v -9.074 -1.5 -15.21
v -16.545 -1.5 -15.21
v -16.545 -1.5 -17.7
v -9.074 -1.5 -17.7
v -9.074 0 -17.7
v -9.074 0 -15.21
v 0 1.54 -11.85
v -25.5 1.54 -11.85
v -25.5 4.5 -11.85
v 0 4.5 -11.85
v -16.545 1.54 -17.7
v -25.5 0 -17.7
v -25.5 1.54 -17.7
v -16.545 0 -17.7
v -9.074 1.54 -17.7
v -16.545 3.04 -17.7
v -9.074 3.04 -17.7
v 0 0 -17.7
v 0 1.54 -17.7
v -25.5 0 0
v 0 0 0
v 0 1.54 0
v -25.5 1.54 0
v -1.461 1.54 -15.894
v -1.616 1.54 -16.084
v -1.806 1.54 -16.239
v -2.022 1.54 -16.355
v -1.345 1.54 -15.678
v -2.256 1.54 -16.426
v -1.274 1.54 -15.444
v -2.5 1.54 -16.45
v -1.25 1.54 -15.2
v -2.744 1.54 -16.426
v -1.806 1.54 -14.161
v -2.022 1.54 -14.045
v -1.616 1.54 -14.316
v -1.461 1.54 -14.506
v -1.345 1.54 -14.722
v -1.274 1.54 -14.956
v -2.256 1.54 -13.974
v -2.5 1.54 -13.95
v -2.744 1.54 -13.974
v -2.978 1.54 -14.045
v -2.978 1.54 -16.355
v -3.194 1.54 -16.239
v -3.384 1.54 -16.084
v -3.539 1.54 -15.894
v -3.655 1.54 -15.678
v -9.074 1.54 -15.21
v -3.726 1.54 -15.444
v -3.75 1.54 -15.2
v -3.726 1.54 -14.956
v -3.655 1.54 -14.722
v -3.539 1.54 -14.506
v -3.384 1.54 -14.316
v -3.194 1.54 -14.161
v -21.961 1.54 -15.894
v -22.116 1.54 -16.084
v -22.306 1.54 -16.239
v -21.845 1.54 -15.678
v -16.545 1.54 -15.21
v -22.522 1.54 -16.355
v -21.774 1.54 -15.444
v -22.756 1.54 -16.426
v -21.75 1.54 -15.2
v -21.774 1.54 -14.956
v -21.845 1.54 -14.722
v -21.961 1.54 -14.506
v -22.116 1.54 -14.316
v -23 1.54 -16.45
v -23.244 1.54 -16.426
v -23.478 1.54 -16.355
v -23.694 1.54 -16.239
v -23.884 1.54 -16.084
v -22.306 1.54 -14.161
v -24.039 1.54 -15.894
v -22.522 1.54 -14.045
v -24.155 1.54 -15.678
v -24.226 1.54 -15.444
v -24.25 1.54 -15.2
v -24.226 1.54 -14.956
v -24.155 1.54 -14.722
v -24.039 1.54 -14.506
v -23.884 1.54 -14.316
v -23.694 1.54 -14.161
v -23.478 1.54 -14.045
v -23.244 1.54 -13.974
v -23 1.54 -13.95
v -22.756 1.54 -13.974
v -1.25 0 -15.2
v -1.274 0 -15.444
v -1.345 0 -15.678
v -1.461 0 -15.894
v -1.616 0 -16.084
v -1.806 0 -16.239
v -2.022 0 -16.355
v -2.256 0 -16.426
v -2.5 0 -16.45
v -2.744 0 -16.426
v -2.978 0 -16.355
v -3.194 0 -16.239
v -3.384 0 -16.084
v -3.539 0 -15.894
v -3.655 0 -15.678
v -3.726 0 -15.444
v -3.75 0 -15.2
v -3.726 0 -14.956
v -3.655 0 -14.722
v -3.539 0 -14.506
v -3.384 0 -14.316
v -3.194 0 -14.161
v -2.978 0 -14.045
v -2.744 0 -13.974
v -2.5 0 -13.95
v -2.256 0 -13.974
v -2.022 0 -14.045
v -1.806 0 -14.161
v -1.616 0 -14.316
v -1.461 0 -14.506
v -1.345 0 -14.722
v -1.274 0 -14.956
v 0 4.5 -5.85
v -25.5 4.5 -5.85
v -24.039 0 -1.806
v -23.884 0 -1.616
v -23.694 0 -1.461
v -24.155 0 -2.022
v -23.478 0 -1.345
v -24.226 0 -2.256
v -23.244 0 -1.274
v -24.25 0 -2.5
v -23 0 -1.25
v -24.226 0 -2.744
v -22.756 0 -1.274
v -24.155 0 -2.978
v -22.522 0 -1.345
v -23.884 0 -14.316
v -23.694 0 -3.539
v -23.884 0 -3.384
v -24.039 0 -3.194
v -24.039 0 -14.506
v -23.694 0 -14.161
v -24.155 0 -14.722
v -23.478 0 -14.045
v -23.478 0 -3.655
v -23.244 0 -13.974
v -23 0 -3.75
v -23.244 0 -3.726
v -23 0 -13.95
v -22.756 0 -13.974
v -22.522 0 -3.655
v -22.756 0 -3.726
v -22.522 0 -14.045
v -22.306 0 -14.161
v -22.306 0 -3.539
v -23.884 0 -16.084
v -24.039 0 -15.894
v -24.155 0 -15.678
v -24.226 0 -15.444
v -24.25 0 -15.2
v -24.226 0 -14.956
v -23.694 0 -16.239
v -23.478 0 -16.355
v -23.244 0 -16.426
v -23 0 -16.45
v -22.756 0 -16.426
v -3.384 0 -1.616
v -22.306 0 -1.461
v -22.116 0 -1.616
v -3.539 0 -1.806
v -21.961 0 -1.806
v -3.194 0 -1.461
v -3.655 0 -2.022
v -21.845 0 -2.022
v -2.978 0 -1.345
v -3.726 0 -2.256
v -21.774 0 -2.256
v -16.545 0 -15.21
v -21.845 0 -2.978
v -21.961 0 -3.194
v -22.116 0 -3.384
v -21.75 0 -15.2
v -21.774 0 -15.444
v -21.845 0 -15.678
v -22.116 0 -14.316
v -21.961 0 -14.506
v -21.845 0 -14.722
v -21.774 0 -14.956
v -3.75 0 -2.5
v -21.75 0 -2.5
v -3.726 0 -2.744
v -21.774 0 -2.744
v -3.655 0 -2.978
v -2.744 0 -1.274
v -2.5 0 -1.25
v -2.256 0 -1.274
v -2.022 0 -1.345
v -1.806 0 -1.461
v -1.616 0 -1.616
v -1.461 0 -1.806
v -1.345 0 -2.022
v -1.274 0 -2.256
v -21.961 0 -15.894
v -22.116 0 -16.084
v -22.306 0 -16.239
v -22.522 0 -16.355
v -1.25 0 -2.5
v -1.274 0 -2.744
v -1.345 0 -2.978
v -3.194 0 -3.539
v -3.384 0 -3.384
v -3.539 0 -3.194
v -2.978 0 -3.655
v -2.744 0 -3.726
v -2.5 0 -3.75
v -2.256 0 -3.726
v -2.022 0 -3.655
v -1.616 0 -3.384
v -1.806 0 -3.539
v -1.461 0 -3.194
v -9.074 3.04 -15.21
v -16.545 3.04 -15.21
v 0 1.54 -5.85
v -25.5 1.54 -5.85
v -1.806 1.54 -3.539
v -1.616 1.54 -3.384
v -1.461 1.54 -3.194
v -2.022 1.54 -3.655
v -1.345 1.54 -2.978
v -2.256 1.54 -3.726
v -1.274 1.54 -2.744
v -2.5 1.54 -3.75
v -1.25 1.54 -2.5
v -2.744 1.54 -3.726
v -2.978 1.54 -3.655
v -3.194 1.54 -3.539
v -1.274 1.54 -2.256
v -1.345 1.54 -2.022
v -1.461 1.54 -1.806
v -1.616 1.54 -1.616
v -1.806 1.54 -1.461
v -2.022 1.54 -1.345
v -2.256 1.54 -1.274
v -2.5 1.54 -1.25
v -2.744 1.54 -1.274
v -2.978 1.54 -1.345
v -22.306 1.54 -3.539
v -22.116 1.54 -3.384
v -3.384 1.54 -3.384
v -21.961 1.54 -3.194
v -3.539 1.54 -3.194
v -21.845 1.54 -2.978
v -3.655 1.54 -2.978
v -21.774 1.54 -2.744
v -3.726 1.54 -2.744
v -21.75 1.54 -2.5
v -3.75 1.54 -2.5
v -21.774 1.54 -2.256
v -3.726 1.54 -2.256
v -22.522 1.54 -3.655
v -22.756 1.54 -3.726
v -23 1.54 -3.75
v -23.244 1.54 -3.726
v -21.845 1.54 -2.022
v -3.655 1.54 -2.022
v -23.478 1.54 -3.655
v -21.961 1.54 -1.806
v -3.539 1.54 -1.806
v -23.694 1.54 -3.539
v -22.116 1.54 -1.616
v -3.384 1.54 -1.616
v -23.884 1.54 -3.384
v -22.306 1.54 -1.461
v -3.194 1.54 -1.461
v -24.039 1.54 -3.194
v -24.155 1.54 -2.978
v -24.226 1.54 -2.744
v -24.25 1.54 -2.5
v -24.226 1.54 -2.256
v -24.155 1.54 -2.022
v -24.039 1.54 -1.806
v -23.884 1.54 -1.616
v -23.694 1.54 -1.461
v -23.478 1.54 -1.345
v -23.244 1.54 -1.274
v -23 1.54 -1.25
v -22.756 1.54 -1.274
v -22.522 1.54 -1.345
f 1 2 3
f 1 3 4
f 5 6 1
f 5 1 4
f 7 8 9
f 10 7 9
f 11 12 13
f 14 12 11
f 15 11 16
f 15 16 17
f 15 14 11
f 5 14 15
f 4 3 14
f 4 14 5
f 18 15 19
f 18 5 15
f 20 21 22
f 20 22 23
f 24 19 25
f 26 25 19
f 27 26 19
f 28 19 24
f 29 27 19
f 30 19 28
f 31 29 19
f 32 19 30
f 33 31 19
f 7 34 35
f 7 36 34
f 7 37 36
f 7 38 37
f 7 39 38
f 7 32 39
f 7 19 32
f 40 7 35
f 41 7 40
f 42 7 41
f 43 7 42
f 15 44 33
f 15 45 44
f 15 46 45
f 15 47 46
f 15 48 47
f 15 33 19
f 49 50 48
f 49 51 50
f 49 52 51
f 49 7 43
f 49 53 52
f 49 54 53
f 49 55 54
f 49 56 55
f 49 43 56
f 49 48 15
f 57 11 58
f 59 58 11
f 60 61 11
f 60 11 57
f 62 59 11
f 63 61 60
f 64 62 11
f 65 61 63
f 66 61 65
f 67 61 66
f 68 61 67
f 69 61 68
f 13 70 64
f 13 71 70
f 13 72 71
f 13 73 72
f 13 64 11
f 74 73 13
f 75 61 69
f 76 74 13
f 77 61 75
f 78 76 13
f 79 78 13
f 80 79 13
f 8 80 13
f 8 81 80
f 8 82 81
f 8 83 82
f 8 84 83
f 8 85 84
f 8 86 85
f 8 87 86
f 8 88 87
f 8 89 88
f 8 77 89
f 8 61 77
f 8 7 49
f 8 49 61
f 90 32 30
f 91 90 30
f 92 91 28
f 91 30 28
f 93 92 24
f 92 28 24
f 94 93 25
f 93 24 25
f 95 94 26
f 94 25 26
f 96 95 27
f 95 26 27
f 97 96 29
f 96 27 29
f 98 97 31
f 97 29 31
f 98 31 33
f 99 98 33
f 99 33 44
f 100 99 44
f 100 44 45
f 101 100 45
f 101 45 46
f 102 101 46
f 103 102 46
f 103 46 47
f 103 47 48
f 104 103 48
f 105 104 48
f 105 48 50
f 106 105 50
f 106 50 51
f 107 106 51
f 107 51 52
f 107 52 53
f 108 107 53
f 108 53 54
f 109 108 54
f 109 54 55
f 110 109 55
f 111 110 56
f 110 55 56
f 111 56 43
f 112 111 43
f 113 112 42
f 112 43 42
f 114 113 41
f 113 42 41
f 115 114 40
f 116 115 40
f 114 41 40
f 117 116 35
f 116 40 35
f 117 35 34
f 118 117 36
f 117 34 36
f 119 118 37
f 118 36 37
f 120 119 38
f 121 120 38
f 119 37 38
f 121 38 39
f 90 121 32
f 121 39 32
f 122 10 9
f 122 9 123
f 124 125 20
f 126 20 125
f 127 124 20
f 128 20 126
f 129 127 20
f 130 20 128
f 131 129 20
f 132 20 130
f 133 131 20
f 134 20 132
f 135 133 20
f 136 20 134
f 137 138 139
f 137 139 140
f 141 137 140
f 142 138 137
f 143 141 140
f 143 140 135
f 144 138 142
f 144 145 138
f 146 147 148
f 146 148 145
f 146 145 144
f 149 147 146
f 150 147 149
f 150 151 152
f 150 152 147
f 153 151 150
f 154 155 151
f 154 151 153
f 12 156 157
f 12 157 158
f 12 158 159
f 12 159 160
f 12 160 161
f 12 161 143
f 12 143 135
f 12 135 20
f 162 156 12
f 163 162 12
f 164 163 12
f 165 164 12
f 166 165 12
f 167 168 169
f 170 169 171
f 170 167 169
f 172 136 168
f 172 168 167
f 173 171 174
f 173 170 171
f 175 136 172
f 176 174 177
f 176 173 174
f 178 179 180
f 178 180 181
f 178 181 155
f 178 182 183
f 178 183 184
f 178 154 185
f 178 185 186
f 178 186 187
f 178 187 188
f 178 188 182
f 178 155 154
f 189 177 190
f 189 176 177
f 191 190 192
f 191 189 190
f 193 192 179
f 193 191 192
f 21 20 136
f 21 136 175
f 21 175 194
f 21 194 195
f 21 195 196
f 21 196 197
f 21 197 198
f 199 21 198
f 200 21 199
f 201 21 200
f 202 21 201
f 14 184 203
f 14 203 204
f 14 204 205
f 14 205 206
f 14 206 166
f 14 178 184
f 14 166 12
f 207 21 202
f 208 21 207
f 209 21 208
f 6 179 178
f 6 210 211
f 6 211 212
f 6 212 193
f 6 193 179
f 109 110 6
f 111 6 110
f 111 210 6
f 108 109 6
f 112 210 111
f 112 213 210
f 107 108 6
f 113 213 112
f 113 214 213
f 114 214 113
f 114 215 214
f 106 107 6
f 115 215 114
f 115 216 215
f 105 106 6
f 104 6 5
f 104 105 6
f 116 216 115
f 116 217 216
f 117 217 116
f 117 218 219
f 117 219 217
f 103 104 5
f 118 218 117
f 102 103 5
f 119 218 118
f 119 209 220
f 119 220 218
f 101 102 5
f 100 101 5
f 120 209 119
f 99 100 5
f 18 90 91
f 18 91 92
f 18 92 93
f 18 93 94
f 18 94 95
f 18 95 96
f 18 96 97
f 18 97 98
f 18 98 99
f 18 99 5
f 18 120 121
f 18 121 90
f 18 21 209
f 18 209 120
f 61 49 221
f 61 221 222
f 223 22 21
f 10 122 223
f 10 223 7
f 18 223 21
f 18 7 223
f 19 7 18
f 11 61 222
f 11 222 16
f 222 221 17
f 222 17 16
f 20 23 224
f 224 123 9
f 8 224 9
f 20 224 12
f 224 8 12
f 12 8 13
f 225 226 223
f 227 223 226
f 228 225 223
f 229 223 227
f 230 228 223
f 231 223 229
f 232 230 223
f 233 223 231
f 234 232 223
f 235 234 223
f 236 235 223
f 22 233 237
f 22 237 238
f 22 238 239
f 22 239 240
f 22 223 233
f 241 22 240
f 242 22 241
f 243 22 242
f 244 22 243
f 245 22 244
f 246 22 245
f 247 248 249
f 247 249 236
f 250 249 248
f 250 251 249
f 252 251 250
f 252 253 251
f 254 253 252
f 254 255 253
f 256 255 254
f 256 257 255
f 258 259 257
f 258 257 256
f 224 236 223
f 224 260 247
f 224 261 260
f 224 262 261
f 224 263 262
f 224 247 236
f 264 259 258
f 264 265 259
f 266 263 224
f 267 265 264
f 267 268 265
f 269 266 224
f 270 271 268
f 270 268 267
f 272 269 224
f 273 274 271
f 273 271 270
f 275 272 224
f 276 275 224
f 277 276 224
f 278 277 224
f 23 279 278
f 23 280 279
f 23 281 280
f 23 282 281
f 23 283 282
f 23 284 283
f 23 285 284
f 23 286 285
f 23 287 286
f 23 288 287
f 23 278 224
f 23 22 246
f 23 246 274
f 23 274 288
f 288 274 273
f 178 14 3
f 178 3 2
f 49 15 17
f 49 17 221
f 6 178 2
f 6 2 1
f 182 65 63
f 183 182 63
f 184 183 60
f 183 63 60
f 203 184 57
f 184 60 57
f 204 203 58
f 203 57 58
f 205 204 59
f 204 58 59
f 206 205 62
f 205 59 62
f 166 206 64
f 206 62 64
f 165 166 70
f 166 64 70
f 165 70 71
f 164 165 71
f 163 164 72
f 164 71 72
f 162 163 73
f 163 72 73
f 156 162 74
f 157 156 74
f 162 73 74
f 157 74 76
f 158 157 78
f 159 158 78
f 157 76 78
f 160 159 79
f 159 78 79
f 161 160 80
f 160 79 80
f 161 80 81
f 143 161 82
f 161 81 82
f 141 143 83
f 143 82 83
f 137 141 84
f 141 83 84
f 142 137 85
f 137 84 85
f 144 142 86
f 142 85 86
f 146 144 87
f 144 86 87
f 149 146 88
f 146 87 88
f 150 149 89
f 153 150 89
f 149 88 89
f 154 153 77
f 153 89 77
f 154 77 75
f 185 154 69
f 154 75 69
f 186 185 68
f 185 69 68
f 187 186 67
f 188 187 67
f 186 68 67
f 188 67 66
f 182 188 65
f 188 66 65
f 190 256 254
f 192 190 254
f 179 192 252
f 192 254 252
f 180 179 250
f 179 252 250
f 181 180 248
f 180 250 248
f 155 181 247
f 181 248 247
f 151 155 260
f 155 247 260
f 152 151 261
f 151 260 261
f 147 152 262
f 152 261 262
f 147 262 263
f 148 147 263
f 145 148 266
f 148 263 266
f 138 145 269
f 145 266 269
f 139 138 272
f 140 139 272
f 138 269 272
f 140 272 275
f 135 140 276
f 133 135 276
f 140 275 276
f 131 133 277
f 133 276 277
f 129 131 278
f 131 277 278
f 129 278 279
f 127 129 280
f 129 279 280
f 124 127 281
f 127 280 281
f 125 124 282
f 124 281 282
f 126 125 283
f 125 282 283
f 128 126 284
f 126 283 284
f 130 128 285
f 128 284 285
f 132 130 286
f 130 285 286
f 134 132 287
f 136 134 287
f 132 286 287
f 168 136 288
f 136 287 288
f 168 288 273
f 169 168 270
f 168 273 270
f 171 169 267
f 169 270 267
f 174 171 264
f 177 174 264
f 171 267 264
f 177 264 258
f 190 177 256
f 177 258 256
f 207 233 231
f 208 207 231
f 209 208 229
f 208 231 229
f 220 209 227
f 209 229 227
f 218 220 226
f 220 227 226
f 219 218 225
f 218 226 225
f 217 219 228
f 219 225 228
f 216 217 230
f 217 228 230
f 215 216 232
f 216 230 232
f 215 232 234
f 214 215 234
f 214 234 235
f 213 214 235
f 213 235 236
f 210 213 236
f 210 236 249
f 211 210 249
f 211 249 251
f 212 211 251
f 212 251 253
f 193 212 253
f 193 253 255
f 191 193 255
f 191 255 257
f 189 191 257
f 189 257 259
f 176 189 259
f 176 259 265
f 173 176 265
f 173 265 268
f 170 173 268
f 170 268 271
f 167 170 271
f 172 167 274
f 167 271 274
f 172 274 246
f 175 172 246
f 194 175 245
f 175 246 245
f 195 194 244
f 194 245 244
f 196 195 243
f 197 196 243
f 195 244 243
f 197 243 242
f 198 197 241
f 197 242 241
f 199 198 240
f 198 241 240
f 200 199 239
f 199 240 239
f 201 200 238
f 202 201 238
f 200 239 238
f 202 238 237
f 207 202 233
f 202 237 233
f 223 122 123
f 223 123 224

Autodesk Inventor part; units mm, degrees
ref_plane "YZ Plane" through (0, 0, 0) normal (1, 0, 0) x (0, 1, 0)
ref_plane "XZ Plane" through (0, 0, 0) normal (0, 1, 0) x (-1, 0, 0)
sketch "Sketch1" plane through (0, 0, 0) normal (0, 1, 0) x (-1, 0, 0)
  line L0 (0, 0) -> (25.5, 0)
  line L1 (25.5, 0) -> (25.5, -17.7)
  line L2 (25.5, -17.7) -> (0, -17.7)
  line L3 (0, -17.7) -> (0, 0)
  dimension "d0" = 25.5
  dimension "d1" = 17.7
extrude "Extrusion1" add sketch "Sketch1" along normal blind 1.54
sketch "Sketch2" plane through (0, 1.54, 0) normal (0, 1, 0) x (1, 0, 0)
  line L0 (-25.5, 0) -> (0, 0) projected
  line L1 (0, 0) -> (-2.5, 0)
  line L2 (-2.5, 0) -> (-2.5, 1.25)
  line L3 (-2.5, 2.5) -> (0, 2.5)
  line L4 (0, 2.5) -> (0, 0)
  circle A0 centre (-2.5, 2.5) radius 1.25
  line L5 (0, 17.7) -> (-25.5, 17.7) projected
  line L6 (0, 0) -> (0, 17.7)
  line L7 (0, 17.7) -> (0, 8.85)
  line L8 (0, 0) -> (0, 17.7) projected
  line L9 (0, 8.85) -> (-1.25, 8.85)
  line L10 (-25.5, 17.7) -> (0, 17.7)
  line L11 (-12.75, 17.7) -> (-12.75, 15.5963)
  circle A1 centre (-23, 2.5) radius 1.25
  circle A2 centre (-2.5, 15.2) radius 1.25
  circle A3 centre (-23, 15.2) radius 1.25
  dimension "d6" = 2.5
  dimension "d4" = 2.5
  dimension "d5" = 2.5
extrude "Extrusion2" cut sketch "Sketch2" against normal blind 1.54 contours A0 | A1 | A2 | A3
sketch "Sketch3" plane through (0, 0, 0) normal (1, 0, 0) x (0, 0, -1)
  line L0 (0, 0) -> (0, 1.54) projected
  line L1 (17.7, 0) -> (17.7, 1.54) projected
  line L2 (0, 0) -> (17.7, 0)
  line L3 (0, 0) -> (17.7, 0) projected
  line L4 (8.85, 0) -> (11.85, 0)
  line L5 (11.85, 0) -> (11.85, 4.5)
  line L6 (11.85, 4.5) -> (5.85, 4.5)
  line L7 (5.85, 4.5) -> (5.85, 0)
  line L8 (5.85, 4.5) -> (11.85, 4.5)
  line L9 (11.85, 4.5) -> (11.85, 0)
  line L10 (11.85, 0) -> (5.85, 0)
  line L11 (5.85, 0) -> (5.85, 4.5)
  dimension "d9" = 3
  dimension "d10" = 4.5
  dimension "d11" = 6
extrude "Extrusion3" add sketch "Sketch3" against normal blind 25.5
sketch "Sketch4" plane through (0, 0, 0) normal (0, -1, 0) x (1, 0, 0)
  line L0 (0, -17.7) -> (-25.5, -17.7) projected
  line L1 (-9.0744, -17.7) -> (-16.5446, -17.7)
  line L2 (-16.5446, -17.7) -> (-16.5446, -15.2098)
  line L3 (-16.5446, -15.2098) -> (-9.0744, -15.2098)
  line L4 (-9.0744, -15.2098) -> (-9.0744, -17.7)
  point P0 (0, 0)
extrude "Extrusion4" add sketch "Sketch4" along normal blind 1.5
ref_plane "Work Plane1" through (0, 0.77, 0) normal (0, -1, 0) x (1, 0, 0)
mirror "Mirror1" about plane through (0, 0.77, 0) normal (0, -1, 0) of "Extrusion4"
properties part number "IMU-mpu6050"
